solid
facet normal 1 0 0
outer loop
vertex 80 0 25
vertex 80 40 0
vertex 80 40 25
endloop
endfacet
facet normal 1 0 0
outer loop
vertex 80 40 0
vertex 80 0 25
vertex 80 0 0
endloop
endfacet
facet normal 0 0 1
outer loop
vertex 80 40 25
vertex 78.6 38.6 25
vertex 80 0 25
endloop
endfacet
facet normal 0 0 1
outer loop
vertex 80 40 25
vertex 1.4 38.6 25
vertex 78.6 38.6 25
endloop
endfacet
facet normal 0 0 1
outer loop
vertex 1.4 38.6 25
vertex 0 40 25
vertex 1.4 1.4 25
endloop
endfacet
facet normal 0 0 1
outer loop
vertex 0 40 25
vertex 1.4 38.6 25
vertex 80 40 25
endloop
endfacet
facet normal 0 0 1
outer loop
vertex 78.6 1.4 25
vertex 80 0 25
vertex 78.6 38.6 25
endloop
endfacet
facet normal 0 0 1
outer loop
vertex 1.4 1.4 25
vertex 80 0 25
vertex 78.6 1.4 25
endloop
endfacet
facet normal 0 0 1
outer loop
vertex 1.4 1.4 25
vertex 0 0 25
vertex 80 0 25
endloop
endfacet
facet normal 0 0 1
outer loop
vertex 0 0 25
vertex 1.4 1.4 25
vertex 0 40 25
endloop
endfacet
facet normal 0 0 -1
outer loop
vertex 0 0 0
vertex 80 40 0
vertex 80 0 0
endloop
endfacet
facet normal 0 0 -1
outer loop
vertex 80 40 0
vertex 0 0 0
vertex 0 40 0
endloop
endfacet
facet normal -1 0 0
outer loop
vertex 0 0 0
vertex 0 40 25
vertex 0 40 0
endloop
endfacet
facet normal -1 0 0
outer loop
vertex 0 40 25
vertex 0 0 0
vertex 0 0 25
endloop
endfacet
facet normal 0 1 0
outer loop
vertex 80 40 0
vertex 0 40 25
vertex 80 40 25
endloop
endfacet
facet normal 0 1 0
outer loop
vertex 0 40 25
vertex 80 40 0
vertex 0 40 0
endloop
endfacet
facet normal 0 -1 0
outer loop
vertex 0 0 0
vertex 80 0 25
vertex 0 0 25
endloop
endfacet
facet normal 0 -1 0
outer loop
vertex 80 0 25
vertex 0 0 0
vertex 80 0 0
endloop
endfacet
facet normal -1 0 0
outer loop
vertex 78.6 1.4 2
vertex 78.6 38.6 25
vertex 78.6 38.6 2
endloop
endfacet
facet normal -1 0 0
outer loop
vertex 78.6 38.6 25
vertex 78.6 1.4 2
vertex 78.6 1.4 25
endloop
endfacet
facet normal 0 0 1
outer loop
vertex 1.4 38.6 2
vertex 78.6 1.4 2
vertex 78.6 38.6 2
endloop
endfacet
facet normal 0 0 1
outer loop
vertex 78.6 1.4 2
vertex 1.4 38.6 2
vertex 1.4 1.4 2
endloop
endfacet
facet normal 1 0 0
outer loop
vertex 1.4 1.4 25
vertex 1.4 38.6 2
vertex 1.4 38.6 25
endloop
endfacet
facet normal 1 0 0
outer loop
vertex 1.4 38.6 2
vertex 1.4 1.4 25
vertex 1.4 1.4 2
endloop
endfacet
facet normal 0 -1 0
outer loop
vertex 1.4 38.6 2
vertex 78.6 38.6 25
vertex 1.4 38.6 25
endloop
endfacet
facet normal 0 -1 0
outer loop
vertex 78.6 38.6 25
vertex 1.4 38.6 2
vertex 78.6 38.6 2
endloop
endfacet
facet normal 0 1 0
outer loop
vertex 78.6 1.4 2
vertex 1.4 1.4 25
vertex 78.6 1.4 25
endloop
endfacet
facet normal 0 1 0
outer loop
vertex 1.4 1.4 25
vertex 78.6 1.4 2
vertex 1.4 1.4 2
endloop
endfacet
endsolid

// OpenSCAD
$fn = 32;

// ----------------------------------------------------------------------
// Open box: 1.4 mm walls
// ----------------------------------------------------------------------

// --- parameters (mm) ---
box_l = 80;               // outer length, X
box_w = 40;               // outer width, Y
box_h = 25;               // outer height, Z
wall = 1.4;               // wall thickness
floor = 2;                // floor thickness

difference() {
  cube([box_l, box_w, box_h]);
  translate([wall, wall, floor])
    cube([box_l - 2 * wall, box_w - 2 * wall, box_h]);
}
